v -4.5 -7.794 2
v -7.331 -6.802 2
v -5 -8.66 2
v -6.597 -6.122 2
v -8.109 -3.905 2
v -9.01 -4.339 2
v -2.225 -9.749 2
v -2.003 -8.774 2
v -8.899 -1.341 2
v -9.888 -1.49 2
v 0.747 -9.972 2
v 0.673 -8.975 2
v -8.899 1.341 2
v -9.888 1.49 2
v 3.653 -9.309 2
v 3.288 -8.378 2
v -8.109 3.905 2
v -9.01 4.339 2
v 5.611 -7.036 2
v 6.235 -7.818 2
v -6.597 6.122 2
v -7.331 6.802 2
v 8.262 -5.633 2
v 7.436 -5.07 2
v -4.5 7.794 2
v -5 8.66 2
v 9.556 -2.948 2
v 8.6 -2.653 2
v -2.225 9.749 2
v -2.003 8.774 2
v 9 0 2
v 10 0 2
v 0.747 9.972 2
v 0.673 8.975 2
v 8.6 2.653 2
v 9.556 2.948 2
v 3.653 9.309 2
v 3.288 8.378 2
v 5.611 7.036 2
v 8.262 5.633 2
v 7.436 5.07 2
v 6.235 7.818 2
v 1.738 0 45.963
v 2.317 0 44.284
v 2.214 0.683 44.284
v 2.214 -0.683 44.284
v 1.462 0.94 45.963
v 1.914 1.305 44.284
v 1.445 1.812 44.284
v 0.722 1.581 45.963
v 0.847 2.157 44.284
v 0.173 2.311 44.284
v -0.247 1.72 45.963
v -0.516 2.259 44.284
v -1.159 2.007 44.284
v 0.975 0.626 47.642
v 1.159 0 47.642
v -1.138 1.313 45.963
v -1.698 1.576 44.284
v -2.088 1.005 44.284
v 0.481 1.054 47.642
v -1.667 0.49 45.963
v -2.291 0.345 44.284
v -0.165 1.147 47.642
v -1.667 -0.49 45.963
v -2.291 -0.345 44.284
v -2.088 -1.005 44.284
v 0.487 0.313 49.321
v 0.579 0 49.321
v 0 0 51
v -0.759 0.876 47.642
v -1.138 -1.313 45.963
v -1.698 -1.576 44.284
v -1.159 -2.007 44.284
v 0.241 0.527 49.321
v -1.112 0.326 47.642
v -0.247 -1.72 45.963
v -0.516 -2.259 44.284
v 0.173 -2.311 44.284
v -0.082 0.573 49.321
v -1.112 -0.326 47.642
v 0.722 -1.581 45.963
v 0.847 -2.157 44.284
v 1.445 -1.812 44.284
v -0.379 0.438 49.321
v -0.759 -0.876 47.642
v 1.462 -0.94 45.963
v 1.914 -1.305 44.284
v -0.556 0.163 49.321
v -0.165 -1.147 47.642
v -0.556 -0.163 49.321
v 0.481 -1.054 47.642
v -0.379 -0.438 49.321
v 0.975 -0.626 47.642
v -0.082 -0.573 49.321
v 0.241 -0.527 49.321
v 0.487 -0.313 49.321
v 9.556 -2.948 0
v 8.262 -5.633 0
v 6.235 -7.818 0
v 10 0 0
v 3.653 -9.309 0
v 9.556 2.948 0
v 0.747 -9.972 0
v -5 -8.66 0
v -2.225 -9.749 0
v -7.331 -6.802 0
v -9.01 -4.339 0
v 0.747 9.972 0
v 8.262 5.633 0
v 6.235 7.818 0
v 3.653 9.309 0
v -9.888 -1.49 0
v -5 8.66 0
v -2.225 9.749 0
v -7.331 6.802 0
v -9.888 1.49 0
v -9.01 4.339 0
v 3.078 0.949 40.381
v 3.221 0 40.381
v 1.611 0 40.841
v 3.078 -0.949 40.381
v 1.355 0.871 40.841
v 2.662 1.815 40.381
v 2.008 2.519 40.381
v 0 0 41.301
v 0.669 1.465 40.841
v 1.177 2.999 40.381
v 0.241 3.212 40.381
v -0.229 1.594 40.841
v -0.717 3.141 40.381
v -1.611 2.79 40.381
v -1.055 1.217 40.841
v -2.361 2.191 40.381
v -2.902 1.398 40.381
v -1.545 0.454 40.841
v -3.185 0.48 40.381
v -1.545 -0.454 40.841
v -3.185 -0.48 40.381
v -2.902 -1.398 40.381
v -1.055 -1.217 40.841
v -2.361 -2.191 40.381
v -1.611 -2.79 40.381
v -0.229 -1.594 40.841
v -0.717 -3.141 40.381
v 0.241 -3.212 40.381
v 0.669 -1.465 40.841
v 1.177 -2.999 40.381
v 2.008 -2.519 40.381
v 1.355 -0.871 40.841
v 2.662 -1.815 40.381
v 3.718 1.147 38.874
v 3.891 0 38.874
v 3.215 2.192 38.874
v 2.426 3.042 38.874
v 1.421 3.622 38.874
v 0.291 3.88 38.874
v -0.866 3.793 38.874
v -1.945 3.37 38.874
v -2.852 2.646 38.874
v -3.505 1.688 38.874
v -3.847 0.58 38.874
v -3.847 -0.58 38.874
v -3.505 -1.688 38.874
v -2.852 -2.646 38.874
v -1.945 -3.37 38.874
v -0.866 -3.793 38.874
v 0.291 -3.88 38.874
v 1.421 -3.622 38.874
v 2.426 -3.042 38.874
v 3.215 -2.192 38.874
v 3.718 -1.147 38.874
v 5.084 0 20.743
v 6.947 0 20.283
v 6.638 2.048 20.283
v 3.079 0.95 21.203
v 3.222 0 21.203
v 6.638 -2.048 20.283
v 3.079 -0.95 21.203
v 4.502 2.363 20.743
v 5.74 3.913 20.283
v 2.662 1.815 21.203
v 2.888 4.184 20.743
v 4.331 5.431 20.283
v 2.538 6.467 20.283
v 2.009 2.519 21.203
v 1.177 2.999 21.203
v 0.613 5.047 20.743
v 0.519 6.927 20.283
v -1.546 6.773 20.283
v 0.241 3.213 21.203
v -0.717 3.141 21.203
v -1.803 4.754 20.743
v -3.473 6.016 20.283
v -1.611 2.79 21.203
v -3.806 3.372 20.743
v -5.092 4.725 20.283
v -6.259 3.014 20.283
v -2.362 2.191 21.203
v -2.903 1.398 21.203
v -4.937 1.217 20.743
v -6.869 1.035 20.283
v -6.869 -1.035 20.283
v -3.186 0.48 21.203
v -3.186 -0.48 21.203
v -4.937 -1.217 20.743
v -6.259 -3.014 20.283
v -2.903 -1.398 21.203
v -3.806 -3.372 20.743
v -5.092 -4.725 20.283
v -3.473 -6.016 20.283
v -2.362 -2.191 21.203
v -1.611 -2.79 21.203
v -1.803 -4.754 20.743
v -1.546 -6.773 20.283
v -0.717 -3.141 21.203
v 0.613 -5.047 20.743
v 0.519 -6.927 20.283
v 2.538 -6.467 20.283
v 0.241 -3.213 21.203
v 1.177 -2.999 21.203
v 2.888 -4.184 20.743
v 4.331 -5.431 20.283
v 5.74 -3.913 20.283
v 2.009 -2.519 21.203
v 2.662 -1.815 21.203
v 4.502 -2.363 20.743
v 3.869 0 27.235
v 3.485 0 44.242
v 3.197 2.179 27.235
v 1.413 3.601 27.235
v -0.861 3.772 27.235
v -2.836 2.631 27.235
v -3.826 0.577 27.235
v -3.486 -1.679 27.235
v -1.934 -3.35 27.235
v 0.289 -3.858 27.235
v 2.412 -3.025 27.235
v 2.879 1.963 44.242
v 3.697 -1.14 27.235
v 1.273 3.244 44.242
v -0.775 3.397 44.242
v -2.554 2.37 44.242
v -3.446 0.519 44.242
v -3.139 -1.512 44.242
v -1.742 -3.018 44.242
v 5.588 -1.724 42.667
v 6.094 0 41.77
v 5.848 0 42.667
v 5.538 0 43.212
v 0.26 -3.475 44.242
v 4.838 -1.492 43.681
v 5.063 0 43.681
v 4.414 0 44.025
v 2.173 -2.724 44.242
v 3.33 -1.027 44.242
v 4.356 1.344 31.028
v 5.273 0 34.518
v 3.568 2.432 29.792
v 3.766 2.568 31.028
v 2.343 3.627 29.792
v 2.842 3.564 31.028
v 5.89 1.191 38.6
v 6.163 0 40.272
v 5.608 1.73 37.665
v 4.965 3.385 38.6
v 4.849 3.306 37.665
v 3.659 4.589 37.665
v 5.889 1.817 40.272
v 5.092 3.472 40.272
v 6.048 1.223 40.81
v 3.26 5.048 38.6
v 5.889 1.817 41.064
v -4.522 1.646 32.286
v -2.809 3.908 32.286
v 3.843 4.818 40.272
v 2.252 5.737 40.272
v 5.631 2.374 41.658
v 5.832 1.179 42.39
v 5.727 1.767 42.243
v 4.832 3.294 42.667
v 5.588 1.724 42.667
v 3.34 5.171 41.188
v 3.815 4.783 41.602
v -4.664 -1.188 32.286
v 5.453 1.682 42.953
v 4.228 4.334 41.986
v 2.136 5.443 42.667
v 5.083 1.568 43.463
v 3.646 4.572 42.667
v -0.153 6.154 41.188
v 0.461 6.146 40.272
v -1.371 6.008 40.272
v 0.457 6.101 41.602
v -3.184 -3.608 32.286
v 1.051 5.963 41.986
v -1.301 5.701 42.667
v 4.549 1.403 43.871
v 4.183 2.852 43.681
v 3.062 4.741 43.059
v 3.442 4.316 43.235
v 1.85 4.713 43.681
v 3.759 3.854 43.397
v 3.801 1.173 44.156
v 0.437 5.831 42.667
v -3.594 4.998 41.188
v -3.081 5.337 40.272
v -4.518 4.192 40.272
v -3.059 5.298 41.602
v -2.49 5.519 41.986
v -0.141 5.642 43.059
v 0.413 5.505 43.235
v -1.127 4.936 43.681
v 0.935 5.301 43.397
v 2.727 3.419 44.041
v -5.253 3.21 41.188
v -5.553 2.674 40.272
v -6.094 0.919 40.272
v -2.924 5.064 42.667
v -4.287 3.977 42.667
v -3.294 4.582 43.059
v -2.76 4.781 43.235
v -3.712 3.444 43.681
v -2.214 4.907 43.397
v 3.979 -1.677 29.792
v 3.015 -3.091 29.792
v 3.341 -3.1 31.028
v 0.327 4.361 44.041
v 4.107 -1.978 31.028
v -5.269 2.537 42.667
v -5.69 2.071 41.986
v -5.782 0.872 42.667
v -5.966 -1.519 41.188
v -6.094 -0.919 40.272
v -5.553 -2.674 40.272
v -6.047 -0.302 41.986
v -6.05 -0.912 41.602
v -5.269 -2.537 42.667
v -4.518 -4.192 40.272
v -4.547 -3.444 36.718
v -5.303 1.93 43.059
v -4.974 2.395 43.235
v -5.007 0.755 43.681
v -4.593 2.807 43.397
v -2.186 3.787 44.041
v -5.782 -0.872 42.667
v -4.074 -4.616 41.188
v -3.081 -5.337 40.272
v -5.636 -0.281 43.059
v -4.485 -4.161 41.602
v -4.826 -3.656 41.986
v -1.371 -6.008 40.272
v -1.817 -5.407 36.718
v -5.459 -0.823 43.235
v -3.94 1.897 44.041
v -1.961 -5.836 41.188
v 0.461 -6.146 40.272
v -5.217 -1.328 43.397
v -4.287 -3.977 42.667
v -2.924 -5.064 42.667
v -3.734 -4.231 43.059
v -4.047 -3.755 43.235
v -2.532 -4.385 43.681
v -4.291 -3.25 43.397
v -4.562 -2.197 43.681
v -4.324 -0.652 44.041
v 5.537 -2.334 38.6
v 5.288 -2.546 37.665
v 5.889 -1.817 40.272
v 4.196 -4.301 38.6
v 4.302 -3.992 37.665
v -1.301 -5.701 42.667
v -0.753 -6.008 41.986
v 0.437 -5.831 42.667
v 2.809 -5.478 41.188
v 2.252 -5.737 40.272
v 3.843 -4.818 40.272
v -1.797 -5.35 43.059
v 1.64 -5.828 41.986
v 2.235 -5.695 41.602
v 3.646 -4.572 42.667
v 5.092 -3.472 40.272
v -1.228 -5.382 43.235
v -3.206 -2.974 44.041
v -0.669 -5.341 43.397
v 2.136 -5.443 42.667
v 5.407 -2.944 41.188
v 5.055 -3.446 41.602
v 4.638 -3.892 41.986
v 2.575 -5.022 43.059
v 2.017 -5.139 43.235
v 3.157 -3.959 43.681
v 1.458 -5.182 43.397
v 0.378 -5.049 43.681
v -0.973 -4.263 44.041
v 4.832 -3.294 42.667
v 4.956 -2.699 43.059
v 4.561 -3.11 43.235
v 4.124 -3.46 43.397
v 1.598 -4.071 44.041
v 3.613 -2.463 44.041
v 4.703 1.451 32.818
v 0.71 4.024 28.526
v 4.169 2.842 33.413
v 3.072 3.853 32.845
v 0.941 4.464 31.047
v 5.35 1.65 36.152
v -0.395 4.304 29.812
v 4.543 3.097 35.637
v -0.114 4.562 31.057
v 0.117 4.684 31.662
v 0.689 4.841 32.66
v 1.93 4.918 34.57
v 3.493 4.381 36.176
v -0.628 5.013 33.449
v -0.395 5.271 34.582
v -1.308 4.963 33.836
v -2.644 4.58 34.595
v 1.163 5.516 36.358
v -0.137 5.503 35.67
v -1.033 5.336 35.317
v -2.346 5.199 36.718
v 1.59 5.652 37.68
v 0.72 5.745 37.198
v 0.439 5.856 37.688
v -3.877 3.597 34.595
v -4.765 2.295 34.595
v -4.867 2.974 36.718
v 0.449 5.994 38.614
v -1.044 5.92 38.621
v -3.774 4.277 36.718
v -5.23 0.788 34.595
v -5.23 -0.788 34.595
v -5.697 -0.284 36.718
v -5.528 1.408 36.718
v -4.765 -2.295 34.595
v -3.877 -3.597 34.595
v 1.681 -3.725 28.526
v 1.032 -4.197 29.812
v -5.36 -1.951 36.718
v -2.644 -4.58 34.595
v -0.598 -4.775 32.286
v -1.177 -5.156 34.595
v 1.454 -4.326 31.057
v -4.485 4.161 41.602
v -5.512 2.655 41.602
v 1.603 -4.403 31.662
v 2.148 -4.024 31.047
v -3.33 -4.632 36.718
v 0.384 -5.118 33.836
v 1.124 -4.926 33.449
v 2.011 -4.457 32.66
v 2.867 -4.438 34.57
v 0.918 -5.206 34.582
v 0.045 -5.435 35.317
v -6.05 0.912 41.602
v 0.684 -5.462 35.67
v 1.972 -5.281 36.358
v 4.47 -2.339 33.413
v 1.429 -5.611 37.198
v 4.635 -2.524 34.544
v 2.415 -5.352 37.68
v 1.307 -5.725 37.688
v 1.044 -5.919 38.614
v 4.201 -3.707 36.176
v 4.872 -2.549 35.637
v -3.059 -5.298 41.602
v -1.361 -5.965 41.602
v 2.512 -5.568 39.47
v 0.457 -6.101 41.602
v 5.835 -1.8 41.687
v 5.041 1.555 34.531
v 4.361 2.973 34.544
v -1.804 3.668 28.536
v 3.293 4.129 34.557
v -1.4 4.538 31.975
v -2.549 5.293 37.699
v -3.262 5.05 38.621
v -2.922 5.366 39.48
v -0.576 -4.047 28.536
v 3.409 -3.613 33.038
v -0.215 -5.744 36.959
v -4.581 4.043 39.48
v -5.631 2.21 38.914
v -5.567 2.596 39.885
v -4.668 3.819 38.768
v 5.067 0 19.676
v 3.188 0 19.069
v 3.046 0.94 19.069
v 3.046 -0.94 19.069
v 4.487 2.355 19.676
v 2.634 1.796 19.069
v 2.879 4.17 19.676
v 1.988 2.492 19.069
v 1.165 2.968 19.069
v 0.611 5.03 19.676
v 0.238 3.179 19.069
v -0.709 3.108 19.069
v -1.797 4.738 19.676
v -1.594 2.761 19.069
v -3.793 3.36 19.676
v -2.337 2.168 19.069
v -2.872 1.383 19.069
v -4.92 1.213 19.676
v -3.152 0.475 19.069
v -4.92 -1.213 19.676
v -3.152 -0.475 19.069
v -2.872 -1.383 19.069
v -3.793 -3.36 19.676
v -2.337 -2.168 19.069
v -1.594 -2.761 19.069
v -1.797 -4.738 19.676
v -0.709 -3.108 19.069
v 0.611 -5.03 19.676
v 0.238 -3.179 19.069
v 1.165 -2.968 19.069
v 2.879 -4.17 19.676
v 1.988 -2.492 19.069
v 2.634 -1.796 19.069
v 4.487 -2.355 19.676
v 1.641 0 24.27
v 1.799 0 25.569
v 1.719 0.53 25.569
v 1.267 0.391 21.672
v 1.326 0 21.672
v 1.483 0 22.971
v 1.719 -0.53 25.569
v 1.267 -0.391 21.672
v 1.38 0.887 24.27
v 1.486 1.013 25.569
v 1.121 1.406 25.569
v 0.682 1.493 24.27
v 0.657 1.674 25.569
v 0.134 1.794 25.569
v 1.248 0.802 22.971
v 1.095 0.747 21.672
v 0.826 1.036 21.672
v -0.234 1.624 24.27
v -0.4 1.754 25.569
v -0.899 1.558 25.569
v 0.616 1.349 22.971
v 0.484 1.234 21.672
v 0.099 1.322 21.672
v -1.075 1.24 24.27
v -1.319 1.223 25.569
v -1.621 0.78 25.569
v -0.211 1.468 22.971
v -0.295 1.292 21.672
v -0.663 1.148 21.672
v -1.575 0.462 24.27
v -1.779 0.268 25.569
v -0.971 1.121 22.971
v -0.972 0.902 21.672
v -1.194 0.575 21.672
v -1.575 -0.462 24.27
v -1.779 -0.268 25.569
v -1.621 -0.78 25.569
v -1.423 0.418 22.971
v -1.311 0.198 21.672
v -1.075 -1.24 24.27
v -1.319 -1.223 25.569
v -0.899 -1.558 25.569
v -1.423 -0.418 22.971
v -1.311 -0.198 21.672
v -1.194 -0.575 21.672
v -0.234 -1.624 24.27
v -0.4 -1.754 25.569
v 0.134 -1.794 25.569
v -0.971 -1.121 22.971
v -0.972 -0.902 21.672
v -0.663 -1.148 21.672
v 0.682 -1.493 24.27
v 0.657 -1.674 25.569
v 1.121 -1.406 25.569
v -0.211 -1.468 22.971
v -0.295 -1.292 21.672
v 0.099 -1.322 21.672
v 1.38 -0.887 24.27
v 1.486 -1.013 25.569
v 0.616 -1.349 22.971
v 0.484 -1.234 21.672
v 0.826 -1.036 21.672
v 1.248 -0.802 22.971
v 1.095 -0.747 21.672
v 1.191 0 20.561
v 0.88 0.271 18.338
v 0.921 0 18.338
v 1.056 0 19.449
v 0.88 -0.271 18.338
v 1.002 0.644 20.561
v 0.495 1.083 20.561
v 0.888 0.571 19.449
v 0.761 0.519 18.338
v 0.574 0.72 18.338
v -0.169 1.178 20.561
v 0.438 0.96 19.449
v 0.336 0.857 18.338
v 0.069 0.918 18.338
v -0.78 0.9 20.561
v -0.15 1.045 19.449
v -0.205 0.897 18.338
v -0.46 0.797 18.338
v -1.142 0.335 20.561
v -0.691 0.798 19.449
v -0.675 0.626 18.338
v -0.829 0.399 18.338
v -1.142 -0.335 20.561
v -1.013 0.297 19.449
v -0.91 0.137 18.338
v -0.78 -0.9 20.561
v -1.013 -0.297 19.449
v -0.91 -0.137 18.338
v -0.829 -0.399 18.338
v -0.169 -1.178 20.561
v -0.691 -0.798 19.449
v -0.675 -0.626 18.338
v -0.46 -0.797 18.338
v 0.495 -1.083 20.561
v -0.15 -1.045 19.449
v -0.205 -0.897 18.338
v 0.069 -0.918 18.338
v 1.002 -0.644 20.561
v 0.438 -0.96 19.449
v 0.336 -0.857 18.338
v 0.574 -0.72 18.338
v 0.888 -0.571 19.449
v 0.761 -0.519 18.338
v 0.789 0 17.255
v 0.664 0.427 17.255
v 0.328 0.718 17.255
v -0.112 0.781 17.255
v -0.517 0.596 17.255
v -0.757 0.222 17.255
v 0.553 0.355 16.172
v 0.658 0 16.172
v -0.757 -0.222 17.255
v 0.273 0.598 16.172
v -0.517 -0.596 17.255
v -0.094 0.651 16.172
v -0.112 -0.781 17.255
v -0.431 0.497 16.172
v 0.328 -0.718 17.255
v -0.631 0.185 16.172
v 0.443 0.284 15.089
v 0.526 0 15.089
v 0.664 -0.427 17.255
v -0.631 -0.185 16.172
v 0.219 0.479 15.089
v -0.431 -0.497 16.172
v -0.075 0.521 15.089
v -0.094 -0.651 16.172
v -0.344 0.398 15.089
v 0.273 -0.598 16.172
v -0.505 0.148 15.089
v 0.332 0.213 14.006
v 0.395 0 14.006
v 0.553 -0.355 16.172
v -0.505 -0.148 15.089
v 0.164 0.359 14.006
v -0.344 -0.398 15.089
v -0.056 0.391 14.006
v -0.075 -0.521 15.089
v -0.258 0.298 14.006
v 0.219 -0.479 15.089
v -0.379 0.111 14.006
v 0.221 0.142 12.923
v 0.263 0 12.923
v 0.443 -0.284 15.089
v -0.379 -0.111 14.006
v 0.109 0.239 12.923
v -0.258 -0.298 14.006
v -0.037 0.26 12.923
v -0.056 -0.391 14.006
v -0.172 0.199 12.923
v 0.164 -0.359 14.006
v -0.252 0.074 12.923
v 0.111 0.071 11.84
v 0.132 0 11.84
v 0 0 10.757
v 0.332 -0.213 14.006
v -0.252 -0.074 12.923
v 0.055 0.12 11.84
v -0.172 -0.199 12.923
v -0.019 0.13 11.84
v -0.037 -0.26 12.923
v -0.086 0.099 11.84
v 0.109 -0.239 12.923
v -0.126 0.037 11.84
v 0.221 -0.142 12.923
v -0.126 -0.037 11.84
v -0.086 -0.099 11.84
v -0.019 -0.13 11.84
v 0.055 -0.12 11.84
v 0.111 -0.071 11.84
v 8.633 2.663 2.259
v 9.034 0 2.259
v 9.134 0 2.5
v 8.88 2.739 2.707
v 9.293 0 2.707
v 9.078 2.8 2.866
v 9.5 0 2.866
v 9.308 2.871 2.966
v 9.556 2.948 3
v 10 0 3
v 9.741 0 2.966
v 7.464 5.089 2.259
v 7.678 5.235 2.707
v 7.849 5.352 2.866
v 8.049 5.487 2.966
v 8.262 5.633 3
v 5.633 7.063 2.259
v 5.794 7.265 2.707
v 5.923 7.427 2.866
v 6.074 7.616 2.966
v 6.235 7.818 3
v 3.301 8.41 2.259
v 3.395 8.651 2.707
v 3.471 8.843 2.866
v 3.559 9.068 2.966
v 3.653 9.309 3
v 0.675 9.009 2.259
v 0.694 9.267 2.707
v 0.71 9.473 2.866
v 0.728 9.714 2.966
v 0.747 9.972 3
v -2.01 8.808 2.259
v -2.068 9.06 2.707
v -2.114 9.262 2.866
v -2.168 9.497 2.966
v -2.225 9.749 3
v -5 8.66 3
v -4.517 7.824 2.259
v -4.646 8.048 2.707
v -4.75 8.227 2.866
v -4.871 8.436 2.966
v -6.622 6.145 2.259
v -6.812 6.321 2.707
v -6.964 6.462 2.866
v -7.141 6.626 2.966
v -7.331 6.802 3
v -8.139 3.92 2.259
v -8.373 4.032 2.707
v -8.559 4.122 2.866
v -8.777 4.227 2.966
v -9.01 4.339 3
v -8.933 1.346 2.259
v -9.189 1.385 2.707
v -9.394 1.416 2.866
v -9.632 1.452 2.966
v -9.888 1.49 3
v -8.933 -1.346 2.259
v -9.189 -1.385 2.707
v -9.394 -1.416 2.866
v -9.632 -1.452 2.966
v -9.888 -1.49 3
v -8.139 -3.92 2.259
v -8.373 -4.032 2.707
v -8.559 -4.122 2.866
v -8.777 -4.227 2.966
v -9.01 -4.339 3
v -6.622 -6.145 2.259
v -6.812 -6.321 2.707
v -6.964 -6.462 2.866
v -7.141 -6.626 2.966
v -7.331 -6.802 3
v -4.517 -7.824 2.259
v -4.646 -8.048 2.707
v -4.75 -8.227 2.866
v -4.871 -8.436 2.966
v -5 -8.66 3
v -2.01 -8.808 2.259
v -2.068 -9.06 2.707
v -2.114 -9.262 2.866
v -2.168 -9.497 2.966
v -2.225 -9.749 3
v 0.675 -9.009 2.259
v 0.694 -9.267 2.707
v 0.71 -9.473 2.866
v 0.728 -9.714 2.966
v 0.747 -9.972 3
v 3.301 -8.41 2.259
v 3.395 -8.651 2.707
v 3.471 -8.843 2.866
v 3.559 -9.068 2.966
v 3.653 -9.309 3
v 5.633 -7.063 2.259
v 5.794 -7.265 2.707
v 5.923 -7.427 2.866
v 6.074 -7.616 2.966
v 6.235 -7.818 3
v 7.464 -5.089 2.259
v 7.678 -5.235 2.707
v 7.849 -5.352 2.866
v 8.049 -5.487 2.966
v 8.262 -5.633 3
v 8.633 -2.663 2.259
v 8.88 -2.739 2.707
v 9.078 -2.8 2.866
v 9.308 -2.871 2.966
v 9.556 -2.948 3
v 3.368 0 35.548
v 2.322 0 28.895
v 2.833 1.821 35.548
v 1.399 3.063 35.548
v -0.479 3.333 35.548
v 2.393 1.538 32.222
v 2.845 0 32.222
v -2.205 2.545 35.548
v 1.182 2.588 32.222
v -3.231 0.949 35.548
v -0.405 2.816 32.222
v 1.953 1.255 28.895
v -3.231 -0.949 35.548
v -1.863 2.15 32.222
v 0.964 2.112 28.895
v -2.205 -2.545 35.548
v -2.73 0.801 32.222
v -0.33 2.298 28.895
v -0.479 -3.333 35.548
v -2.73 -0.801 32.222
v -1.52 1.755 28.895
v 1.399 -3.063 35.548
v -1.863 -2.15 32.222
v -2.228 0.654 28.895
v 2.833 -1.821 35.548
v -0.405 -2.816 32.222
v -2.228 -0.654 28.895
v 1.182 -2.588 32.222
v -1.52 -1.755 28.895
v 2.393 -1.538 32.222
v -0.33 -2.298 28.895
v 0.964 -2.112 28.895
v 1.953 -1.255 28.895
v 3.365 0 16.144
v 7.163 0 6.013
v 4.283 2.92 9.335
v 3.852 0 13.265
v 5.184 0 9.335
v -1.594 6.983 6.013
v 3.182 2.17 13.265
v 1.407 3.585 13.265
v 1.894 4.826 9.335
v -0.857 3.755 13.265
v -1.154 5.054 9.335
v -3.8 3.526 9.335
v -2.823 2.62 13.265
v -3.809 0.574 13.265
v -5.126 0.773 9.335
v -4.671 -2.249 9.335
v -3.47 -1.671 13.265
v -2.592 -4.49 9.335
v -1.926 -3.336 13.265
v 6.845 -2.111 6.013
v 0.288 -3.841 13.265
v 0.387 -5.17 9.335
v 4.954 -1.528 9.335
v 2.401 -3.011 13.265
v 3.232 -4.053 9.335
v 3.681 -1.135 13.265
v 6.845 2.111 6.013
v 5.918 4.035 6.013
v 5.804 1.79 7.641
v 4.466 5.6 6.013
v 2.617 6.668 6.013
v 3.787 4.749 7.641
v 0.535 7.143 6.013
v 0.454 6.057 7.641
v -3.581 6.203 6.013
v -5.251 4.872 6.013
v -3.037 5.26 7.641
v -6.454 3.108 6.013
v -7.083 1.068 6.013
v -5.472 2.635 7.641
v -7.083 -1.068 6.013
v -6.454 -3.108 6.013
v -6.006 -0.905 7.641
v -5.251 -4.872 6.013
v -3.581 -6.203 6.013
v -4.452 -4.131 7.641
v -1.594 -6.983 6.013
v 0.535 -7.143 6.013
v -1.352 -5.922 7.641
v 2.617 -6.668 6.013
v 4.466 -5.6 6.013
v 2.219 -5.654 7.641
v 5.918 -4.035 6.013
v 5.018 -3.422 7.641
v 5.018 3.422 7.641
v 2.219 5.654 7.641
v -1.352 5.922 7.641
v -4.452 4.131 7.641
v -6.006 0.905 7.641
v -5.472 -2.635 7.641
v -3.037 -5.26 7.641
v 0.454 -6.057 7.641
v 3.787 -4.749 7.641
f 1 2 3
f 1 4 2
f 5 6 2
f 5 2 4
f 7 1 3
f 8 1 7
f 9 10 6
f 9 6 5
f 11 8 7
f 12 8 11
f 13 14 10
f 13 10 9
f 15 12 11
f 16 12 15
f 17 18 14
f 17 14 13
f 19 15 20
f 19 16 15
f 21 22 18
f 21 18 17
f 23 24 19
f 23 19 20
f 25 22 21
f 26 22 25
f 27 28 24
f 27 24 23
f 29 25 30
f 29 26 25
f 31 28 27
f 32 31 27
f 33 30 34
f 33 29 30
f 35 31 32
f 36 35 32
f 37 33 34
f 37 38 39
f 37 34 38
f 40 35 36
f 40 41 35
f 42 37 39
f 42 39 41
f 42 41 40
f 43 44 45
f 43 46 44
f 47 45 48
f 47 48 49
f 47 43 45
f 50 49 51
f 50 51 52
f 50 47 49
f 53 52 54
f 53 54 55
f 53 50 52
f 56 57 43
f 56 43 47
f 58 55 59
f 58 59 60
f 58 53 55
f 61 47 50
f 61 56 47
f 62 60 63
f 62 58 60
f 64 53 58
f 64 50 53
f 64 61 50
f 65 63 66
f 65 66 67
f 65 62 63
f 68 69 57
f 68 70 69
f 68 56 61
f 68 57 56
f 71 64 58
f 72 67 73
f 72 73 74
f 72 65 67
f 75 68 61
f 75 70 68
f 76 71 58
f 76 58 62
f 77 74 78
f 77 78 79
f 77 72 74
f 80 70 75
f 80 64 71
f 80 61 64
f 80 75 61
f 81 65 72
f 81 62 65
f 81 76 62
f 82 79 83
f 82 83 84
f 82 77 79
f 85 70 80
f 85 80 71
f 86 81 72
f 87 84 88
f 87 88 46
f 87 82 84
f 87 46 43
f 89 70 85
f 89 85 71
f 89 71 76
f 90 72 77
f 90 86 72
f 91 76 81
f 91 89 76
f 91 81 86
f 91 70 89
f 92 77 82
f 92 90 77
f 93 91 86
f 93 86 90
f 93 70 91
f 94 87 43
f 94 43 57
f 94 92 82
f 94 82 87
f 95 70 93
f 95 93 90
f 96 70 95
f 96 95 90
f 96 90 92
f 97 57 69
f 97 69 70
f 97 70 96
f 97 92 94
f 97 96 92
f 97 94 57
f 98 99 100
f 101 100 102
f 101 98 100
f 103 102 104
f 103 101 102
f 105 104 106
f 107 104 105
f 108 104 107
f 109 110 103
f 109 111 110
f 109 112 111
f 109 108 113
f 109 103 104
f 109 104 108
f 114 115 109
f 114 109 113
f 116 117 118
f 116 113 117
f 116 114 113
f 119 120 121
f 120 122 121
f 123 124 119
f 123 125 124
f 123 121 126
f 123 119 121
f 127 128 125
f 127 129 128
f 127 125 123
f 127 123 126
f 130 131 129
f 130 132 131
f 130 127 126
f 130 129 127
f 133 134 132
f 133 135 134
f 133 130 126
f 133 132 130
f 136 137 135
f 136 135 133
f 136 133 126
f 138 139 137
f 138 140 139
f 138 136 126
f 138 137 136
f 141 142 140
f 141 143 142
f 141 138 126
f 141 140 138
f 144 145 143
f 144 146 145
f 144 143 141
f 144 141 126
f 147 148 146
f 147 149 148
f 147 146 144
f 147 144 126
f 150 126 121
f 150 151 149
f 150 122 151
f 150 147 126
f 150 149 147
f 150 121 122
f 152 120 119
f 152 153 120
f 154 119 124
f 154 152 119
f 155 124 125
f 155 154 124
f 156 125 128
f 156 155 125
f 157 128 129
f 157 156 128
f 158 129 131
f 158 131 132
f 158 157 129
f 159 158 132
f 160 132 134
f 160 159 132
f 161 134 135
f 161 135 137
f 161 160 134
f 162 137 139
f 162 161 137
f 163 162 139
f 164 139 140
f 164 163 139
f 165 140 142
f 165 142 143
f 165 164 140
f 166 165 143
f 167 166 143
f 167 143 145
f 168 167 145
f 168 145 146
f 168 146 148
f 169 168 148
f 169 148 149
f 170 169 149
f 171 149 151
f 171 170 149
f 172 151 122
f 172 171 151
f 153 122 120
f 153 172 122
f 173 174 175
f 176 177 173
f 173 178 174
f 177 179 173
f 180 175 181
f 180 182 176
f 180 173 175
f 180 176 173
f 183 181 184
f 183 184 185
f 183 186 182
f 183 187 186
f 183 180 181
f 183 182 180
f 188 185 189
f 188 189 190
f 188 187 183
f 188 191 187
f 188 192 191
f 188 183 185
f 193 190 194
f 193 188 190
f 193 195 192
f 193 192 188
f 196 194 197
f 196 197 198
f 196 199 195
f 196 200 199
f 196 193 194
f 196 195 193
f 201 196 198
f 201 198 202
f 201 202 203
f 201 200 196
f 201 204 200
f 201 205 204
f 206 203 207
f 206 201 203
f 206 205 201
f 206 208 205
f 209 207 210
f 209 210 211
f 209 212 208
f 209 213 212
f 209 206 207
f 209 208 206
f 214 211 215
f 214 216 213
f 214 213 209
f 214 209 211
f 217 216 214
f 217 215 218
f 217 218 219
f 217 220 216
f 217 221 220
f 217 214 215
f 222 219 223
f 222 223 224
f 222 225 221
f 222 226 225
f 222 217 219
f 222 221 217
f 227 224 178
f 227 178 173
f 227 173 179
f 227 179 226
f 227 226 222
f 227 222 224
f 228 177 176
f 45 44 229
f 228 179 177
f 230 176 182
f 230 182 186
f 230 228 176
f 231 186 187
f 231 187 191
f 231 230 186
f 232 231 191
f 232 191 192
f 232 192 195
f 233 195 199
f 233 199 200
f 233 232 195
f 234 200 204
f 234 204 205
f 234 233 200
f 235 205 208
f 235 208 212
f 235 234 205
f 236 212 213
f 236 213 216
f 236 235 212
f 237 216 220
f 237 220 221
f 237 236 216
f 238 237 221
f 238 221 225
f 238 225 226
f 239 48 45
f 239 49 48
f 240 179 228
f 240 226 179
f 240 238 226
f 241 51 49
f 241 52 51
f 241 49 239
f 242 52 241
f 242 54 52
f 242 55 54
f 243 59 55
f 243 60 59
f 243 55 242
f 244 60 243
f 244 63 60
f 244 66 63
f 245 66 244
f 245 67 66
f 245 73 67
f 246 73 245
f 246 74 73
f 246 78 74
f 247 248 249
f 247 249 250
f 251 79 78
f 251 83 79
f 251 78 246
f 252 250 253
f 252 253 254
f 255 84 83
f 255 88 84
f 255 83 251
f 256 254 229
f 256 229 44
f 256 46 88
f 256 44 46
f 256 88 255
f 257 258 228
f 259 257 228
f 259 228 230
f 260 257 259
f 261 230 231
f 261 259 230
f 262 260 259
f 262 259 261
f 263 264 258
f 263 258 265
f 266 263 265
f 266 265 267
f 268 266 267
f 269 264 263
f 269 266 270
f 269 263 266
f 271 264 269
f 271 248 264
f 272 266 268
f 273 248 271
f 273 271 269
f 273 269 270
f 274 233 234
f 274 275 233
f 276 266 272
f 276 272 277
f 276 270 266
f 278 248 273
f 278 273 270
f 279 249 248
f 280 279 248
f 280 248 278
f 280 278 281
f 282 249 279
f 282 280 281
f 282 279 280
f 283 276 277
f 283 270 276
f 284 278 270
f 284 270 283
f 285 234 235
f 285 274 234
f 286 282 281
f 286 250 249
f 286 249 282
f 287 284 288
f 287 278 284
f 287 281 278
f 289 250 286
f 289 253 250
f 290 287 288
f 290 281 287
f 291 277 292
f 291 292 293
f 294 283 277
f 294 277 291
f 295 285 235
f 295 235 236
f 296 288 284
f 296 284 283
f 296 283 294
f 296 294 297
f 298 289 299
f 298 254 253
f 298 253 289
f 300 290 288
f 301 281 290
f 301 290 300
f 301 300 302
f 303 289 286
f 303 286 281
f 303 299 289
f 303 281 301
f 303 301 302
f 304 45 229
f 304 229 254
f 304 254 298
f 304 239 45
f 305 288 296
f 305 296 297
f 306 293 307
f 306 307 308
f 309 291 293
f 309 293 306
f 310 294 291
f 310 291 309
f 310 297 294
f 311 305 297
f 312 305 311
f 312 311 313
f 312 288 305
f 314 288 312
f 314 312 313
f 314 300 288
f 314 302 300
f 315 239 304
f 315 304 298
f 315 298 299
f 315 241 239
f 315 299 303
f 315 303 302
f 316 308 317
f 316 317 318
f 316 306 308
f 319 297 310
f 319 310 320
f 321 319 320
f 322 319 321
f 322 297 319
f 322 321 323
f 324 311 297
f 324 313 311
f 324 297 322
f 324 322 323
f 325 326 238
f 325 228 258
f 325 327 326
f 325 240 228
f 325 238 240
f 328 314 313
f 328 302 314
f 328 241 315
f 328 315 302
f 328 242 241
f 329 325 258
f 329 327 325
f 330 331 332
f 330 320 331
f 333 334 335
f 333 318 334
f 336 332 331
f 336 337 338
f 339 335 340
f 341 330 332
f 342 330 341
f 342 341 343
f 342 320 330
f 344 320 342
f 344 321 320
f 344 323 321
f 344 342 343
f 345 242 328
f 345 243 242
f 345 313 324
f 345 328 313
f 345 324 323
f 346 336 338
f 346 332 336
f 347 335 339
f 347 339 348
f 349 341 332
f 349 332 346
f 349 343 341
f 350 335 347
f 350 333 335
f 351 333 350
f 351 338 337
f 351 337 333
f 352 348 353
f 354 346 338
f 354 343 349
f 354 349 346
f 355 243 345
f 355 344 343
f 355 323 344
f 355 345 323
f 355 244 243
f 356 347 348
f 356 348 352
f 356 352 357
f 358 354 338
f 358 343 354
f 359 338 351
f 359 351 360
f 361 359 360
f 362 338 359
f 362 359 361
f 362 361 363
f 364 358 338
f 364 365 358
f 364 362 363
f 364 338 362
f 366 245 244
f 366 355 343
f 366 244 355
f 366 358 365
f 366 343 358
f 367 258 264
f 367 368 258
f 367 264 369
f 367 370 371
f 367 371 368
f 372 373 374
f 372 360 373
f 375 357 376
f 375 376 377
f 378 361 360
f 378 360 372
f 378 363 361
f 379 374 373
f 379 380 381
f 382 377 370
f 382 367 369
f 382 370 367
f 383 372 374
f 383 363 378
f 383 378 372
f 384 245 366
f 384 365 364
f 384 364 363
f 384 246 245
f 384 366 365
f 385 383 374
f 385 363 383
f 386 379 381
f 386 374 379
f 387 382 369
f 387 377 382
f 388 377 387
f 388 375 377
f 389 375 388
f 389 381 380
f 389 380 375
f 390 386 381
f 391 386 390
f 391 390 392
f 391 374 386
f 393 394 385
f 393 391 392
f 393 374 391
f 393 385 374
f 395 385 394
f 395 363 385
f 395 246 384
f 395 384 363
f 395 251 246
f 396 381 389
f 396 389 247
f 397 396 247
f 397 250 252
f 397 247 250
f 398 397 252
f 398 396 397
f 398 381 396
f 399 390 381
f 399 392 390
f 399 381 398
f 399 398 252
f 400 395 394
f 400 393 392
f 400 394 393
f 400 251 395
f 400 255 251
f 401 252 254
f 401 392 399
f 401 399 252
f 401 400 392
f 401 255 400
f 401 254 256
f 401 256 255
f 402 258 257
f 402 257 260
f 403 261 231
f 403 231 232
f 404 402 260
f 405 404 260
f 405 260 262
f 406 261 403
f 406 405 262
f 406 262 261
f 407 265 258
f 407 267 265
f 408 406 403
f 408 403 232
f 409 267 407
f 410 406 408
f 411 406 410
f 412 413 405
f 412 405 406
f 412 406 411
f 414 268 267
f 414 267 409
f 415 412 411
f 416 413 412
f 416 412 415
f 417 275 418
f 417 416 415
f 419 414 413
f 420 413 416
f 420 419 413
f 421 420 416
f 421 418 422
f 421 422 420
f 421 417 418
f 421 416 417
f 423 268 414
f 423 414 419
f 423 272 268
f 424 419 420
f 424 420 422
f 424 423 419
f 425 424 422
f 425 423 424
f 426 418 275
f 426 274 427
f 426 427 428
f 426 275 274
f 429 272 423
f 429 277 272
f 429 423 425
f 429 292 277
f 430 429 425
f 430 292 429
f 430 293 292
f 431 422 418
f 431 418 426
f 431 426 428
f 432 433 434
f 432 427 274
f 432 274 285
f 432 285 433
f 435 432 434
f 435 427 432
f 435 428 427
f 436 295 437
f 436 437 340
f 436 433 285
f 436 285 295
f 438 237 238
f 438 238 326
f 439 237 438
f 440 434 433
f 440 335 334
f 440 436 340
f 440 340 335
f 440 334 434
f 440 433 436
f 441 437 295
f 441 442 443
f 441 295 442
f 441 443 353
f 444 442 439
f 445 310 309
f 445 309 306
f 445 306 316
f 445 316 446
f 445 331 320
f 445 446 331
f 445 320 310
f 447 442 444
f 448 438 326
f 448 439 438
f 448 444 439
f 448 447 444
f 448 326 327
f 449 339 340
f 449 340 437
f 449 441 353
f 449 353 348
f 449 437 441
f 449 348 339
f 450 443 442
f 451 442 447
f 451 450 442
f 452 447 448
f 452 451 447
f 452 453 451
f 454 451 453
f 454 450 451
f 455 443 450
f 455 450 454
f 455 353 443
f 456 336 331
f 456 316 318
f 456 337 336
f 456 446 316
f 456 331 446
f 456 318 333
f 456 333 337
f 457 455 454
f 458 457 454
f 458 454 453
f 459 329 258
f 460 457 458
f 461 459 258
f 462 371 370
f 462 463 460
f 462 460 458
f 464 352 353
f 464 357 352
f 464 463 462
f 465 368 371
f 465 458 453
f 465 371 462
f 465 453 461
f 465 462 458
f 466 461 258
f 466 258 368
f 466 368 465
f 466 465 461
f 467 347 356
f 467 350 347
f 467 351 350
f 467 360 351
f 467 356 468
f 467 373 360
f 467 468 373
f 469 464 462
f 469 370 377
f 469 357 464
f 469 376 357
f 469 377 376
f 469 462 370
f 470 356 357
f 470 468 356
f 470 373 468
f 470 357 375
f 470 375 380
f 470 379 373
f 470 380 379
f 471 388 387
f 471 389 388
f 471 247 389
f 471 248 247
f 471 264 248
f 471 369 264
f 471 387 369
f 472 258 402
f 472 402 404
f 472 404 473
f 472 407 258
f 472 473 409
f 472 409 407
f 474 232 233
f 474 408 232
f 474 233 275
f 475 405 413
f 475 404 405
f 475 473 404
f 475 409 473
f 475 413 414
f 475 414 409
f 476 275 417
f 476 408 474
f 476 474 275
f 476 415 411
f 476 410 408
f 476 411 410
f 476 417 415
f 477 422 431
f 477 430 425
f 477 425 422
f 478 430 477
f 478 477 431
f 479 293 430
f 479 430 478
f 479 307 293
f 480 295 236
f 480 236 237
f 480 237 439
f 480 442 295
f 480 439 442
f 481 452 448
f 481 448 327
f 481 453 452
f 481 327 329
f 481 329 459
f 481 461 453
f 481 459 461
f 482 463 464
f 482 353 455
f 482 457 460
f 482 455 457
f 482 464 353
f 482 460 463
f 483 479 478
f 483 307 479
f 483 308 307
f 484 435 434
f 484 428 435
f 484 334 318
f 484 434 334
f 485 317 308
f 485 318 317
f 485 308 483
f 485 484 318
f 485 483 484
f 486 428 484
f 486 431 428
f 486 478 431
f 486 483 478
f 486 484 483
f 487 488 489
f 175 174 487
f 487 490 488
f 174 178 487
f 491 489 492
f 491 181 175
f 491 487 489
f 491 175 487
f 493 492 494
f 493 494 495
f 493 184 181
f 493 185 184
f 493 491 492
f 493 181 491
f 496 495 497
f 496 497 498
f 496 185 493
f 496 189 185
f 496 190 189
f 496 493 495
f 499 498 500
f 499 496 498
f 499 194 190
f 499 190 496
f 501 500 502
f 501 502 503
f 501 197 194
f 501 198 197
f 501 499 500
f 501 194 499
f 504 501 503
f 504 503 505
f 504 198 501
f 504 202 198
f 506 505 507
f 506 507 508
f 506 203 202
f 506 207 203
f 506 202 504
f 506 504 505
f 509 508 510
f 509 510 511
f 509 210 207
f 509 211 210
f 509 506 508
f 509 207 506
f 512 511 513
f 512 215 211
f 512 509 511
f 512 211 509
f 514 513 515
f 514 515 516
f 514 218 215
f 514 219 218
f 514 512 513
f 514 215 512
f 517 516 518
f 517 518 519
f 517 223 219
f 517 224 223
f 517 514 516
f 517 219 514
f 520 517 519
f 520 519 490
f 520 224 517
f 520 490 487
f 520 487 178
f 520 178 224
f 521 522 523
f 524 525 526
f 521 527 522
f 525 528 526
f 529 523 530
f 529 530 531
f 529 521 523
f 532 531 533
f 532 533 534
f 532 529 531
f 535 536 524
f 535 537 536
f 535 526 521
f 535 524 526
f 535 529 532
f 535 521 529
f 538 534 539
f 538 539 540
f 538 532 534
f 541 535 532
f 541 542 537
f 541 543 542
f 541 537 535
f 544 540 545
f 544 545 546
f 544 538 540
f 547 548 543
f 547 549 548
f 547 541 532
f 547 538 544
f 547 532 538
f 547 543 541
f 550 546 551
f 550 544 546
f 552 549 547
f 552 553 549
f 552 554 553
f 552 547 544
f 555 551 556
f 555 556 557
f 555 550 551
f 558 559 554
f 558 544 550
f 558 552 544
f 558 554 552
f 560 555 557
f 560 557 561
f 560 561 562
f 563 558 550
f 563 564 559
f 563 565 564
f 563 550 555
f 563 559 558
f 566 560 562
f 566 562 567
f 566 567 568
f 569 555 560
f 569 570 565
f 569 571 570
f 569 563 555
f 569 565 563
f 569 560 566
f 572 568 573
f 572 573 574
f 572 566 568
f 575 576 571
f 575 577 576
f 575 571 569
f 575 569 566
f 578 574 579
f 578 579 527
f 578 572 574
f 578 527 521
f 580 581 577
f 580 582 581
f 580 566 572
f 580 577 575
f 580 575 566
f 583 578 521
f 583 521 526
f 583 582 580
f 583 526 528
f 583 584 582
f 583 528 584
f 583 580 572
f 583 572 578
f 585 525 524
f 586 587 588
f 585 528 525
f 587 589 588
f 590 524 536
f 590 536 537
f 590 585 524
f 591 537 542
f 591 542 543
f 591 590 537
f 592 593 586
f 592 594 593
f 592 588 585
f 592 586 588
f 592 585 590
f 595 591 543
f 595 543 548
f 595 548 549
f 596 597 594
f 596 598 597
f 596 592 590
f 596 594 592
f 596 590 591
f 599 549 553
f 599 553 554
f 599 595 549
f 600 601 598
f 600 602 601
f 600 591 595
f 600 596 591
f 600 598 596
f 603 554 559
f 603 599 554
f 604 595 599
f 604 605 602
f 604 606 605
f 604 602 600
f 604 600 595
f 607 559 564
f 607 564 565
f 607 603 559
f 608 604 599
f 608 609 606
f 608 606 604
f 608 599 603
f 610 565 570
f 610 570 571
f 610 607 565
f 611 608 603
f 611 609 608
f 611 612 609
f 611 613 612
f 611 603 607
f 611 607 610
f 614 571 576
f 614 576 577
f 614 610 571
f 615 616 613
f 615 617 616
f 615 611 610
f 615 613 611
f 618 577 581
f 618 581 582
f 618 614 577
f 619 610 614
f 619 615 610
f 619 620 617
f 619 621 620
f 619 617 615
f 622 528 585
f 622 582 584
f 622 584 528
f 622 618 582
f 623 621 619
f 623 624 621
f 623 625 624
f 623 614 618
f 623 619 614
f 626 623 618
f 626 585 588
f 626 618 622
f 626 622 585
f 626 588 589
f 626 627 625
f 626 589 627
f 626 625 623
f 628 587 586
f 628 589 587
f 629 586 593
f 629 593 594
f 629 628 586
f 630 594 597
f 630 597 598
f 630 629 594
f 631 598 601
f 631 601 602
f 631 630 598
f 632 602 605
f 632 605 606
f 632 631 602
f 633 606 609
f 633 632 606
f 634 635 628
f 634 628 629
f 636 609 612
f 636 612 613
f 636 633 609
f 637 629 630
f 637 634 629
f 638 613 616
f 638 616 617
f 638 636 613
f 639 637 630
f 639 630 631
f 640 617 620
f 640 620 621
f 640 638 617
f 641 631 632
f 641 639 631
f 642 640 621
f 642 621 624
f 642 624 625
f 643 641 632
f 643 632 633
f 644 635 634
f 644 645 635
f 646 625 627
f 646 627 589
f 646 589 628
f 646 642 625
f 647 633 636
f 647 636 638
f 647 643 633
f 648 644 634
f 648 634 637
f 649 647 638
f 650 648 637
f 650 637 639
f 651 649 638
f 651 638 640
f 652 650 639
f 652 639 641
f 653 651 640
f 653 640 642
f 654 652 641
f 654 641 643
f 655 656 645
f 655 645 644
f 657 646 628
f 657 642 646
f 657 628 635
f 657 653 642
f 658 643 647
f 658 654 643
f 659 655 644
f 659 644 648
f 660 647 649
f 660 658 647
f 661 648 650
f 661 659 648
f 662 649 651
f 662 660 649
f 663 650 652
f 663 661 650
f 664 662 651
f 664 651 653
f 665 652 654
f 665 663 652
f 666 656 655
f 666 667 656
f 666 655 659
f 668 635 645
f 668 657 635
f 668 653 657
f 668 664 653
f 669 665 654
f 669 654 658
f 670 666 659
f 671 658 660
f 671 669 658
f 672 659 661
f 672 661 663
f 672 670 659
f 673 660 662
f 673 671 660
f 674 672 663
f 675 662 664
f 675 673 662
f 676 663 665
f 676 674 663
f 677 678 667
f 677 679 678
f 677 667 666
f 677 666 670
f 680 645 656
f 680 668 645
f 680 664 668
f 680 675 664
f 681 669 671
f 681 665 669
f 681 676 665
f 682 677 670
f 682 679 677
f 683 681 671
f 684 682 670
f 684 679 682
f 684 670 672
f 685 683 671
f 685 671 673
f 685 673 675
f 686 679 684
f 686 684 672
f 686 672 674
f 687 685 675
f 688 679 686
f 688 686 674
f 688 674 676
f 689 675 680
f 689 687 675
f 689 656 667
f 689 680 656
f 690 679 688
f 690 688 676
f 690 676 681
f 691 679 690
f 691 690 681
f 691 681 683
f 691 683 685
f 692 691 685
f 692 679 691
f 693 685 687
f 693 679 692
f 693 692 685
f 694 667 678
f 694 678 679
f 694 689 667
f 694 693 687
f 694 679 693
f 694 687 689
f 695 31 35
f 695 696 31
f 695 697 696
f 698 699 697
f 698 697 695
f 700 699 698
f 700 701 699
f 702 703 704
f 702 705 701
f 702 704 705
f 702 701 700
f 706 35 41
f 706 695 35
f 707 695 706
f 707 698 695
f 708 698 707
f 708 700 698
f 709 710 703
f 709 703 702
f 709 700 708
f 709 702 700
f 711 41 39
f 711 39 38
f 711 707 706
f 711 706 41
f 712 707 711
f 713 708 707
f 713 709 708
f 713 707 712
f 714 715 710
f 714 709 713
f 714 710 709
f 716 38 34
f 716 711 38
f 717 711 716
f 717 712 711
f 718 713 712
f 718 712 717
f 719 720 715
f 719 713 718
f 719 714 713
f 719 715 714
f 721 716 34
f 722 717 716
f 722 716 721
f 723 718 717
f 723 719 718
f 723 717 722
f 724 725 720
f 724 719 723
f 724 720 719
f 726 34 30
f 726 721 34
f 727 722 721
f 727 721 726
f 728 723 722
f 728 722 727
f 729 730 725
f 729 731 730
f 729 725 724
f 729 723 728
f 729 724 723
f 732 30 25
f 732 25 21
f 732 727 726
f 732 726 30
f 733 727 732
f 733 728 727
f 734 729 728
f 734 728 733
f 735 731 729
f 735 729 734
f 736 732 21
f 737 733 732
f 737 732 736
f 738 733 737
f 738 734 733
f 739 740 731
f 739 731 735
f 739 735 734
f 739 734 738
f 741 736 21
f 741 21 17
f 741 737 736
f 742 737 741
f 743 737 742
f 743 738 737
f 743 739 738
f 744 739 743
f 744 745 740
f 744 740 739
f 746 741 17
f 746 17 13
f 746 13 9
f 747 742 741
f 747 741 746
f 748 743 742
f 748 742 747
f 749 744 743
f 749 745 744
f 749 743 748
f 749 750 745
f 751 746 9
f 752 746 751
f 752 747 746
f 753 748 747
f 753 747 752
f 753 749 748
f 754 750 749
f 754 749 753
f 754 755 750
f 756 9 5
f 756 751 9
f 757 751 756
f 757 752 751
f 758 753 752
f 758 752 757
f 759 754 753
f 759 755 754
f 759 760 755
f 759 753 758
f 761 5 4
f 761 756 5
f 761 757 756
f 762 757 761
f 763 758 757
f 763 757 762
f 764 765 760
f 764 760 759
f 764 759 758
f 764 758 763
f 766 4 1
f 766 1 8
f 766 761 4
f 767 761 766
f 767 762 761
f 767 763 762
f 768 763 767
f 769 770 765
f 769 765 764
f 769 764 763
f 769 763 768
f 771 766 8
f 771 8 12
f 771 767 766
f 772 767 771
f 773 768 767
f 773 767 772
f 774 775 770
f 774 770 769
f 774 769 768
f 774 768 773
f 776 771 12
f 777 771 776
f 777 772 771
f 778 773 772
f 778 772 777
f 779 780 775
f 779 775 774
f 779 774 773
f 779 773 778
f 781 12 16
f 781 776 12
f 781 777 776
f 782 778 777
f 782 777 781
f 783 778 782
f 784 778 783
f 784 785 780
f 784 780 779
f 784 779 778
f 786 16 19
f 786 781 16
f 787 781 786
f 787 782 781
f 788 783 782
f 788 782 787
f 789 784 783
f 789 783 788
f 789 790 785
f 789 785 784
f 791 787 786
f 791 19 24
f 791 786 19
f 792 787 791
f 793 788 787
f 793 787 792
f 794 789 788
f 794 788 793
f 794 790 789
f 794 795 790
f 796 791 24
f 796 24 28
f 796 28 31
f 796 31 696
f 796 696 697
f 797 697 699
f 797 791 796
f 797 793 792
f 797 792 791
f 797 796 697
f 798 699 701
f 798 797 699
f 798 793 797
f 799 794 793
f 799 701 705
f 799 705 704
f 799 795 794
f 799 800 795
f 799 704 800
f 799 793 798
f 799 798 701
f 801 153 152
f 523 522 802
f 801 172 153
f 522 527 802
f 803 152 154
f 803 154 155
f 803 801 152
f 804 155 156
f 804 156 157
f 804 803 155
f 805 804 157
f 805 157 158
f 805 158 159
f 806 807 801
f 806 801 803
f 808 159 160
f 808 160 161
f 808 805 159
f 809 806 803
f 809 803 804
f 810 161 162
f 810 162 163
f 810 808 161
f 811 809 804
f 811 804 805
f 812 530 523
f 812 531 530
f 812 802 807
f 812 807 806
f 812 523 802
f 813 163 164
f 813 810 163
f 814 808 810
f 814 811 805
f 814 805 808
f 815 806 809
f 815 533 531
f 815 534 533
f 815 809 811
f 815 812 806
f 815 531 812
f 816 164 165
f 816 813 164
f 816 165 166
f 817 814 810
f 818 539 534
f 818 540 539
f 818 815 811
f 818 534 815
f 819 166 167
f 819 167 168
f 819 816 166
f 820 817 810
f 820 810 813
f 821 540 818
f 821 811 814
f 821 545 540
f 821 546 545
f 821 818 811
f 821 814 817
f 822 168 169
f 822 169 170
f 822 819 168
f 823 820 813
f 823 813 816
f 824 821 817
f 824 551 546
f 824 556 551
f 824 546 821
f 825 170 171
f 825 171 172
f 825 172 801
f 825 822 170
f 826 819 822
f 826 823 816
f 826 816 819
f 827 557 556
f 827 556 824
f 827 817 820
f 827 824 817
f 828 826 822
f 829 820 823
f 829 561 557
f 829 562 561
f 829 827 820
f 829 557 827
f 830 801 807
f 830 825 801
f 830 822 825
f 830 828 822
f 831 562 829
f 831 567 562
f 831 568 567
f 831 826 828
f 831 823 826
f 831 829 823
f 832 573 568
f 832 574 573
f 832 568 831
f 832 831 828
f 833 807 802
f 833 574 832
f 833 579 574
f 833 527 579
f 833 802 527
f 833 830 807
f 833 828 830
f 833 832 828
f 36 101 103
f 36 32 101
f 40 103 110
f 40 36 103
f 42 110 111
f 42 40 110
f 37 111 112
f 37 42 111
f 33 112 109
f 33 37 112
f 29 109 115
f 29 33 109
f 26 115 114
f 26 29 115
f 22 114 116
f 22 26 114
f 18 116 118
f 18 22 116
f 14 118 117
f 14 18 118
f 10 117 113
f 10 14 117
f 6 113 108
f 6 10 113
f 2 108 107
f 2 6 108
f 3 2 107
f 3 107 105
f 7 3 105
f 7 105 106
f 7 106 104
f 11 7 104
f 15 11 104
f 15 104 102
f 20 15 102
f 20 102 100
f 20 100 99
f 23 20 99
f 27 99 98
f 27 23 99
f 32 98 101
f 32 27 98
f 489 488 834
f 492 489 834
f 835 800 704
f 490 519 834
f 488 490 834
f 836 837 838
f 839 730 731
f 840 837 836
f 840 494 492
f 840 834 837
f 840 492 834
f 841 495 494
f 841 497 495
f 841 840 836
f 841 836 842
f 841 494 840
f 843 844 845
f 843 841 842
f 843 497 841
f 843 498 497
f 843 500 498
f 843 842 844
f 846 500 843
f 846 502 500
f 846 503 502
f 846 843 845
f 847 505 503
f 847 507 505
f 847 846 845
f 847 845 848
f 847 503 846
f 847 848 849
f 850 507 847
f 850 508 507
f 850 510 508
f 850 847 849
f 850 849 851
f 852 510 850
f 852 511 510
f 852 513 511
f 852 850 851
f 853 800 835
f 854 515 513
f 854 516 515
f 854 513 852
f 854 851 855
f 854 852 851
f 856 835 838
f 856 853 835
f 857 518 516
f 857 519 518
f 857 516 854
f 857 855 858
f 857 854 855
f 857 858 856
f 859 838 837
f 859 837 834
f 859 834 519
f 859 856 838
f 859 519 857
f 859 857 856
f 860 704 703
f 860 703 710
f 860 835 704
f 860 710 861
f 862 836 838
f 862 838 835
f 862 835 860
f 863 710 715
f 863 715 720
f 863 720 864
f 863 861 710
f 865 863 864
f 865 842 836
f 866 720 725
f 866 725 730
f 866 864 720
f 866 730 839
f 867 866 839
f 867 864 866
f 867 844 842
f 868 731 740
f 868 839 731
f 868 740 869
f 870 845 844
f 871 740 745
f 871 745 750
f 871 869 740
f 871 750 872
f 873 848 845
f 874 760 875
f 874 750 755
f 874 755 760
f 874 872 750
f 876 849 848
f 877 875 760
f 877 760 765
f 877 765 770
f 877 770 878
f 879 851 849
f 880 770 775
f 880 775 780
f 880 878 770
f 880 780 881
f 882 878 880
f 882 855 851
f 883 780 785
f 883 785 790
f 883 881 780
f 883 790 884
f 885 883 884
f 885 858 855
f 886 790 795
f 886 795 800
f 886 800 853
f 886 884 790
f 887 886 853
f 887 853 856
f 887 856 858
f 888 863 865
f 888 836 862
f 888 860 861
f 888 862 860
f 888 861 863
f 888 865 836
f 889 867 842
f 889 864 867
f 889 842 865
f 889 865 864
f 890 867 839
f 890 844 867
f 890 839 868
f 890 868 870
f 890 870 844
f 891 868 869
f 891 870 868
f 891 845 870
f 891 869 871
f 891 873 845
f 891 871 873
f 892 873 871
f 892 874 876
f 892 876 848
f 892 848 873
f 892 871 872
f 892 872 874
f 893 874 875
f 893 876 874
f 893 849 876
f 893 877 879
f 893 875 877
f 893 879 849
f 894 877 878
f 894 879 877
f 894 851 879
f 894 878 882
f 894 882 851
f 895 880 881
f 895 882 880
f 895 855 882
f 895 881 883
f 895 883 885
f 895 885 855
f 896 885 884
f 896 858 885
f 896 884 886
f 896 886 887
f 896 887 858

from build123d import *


# Not quite as in the source:
# - a feature names something its author has since deleted; it is built from what else it names


with BuildPart() as f1:
    # F0 (on Front) → F1 (revolve)
    with BuildSketch(Plane.XZ):
        with BuildLine():
            Line((0, 10.7571836561), (0, 0))
            Line((0, 0), (10, 0))
            Line((10, 0), (10, 2))
            Line((10, 2), (9, 2))
            ThreePointArc((9, 2), (9.2928932188, 2.7071067812), (10, 3))
            add(Edge.make_bspline(
                [(10, 3), (4.8616999982, 7.4005079185), (3.2689606671, 13.2153081121), (3.1879616163, 19.0694751767)],
                knots=[0, 0, 0, 0, 0.2884989323, 0.2884989323, 0.2884989323, 0.2884989323], degree=3))
            Line((3.1879616163, 19.0694751767), (0.9205695706, 18.3377522863))
            Line((0.9205695706, 18.3377522863), (0, 10.7571836561))
        make_face()
        with BuildLine():
            Line((0, 51), (0, 44))
            add(Edge.make_bspline(
                [(2.3170218427, 44.2838583015), (1.6508949311, 44.2597847974), (0.8824741052, 44.1653776789), (0, 44)],
                knots=[0.9455867567, 0.9455867567, 0.9455867567, 0.9455867567, 1, 1, 1, 1], degree=3))
            Line((2.3170218427, 44.2838583015), (0, 51))
        make_face()
        with BuildLine():
            Line((1.3255104114, 21.6722985633), (0.9205695706, 18.3377522863))
            Line((0.9205695706, 18.3377522863), (3.1879616163, 19.0694751767))
            add(Edge.make_bspline(
                [(3.1879616163, 19.0694751767), (3.1781161003, 19.7810550677), (3.1906060131, 20.4932165904), (3.2217788711, 21.203490553)],
                knots=[0.2884989323, 0.2884989323, 0.2884989323, 0.2884989323, 0.3235662675, 0.3235662675, 0.3235662675, 0.3235662675], degree=3))
            Line((3.2217788711, 21.203490553), (1.3255104114, 21.6722985633))
        make_face()
        with BuildLine():
            add(Edge.make_bspline(
                [(3.1879616163, 19.0694751767), (3.1781161003, 19.7810550677), (3.1906060131, 20.4932165904), (3.2217788711, 21.203490553)],
                knots=[0.2884989323, 0.2884989323, 0.2884989323, 0.2884989323, 0.3235662675, 0.3235662675, 0.3235662675, 0.3235662675], degree=3))
            Line((3.1879616163, 19.0694751767), (6.9468966685, 20.282542333))
            Line((6.9468966685, 20.282542333), (3.2217788711, 21.203490553))
        make_face()
        with BuildLine():
            Line((1.7987132305, 25.5689583719), (1.3255104114, 21.6722985633))
            Line((1.3255104114, 21.6722985633), (3.2217788711, 21.203490553))
            add(Edge.make_bspline(
                [(3.2217788711, 21.203490553), (3.551315279, 28.7119817542), (7.6075295102, 40.9568023902), (5.393614482, 44.39504487), (2.3170218427, 44.2838583015)],
                knots=[0.3235662675, 0.3235662675, 0.3235662675, 0.3235662675, 0.6942722088, 0.9455867567, 0.9455867567, 0.9455867567, 0.9455867567], degree=3))
            add(Edge.make_bspline(
                [(2.3170218427, 44.2838583015), (1.6508949311, 44.2597847974), (0.8824741052, 44.1653776789), (0, 44)],
                knots=[0.9455867567, 0.9455867567, 0.9455867567, 0.9455867567, 1, 1, 1, 1], degree=3))
            Line((0, 44), (0, 41.3012392819))
            Line((0, 41.3012392819), (3.2213132363, 40.3807349503))
            Line((3.2213132363, 40.3807349503), (3.8907721173, 38.874451071))
            Line((3.8907721173, 38.874451071), (1.7987132305, 25.5689583719))
        make_face()
    revolve(axis=Axis((0, 0, 22), (0, 0, 1)))


solid = f1.part
